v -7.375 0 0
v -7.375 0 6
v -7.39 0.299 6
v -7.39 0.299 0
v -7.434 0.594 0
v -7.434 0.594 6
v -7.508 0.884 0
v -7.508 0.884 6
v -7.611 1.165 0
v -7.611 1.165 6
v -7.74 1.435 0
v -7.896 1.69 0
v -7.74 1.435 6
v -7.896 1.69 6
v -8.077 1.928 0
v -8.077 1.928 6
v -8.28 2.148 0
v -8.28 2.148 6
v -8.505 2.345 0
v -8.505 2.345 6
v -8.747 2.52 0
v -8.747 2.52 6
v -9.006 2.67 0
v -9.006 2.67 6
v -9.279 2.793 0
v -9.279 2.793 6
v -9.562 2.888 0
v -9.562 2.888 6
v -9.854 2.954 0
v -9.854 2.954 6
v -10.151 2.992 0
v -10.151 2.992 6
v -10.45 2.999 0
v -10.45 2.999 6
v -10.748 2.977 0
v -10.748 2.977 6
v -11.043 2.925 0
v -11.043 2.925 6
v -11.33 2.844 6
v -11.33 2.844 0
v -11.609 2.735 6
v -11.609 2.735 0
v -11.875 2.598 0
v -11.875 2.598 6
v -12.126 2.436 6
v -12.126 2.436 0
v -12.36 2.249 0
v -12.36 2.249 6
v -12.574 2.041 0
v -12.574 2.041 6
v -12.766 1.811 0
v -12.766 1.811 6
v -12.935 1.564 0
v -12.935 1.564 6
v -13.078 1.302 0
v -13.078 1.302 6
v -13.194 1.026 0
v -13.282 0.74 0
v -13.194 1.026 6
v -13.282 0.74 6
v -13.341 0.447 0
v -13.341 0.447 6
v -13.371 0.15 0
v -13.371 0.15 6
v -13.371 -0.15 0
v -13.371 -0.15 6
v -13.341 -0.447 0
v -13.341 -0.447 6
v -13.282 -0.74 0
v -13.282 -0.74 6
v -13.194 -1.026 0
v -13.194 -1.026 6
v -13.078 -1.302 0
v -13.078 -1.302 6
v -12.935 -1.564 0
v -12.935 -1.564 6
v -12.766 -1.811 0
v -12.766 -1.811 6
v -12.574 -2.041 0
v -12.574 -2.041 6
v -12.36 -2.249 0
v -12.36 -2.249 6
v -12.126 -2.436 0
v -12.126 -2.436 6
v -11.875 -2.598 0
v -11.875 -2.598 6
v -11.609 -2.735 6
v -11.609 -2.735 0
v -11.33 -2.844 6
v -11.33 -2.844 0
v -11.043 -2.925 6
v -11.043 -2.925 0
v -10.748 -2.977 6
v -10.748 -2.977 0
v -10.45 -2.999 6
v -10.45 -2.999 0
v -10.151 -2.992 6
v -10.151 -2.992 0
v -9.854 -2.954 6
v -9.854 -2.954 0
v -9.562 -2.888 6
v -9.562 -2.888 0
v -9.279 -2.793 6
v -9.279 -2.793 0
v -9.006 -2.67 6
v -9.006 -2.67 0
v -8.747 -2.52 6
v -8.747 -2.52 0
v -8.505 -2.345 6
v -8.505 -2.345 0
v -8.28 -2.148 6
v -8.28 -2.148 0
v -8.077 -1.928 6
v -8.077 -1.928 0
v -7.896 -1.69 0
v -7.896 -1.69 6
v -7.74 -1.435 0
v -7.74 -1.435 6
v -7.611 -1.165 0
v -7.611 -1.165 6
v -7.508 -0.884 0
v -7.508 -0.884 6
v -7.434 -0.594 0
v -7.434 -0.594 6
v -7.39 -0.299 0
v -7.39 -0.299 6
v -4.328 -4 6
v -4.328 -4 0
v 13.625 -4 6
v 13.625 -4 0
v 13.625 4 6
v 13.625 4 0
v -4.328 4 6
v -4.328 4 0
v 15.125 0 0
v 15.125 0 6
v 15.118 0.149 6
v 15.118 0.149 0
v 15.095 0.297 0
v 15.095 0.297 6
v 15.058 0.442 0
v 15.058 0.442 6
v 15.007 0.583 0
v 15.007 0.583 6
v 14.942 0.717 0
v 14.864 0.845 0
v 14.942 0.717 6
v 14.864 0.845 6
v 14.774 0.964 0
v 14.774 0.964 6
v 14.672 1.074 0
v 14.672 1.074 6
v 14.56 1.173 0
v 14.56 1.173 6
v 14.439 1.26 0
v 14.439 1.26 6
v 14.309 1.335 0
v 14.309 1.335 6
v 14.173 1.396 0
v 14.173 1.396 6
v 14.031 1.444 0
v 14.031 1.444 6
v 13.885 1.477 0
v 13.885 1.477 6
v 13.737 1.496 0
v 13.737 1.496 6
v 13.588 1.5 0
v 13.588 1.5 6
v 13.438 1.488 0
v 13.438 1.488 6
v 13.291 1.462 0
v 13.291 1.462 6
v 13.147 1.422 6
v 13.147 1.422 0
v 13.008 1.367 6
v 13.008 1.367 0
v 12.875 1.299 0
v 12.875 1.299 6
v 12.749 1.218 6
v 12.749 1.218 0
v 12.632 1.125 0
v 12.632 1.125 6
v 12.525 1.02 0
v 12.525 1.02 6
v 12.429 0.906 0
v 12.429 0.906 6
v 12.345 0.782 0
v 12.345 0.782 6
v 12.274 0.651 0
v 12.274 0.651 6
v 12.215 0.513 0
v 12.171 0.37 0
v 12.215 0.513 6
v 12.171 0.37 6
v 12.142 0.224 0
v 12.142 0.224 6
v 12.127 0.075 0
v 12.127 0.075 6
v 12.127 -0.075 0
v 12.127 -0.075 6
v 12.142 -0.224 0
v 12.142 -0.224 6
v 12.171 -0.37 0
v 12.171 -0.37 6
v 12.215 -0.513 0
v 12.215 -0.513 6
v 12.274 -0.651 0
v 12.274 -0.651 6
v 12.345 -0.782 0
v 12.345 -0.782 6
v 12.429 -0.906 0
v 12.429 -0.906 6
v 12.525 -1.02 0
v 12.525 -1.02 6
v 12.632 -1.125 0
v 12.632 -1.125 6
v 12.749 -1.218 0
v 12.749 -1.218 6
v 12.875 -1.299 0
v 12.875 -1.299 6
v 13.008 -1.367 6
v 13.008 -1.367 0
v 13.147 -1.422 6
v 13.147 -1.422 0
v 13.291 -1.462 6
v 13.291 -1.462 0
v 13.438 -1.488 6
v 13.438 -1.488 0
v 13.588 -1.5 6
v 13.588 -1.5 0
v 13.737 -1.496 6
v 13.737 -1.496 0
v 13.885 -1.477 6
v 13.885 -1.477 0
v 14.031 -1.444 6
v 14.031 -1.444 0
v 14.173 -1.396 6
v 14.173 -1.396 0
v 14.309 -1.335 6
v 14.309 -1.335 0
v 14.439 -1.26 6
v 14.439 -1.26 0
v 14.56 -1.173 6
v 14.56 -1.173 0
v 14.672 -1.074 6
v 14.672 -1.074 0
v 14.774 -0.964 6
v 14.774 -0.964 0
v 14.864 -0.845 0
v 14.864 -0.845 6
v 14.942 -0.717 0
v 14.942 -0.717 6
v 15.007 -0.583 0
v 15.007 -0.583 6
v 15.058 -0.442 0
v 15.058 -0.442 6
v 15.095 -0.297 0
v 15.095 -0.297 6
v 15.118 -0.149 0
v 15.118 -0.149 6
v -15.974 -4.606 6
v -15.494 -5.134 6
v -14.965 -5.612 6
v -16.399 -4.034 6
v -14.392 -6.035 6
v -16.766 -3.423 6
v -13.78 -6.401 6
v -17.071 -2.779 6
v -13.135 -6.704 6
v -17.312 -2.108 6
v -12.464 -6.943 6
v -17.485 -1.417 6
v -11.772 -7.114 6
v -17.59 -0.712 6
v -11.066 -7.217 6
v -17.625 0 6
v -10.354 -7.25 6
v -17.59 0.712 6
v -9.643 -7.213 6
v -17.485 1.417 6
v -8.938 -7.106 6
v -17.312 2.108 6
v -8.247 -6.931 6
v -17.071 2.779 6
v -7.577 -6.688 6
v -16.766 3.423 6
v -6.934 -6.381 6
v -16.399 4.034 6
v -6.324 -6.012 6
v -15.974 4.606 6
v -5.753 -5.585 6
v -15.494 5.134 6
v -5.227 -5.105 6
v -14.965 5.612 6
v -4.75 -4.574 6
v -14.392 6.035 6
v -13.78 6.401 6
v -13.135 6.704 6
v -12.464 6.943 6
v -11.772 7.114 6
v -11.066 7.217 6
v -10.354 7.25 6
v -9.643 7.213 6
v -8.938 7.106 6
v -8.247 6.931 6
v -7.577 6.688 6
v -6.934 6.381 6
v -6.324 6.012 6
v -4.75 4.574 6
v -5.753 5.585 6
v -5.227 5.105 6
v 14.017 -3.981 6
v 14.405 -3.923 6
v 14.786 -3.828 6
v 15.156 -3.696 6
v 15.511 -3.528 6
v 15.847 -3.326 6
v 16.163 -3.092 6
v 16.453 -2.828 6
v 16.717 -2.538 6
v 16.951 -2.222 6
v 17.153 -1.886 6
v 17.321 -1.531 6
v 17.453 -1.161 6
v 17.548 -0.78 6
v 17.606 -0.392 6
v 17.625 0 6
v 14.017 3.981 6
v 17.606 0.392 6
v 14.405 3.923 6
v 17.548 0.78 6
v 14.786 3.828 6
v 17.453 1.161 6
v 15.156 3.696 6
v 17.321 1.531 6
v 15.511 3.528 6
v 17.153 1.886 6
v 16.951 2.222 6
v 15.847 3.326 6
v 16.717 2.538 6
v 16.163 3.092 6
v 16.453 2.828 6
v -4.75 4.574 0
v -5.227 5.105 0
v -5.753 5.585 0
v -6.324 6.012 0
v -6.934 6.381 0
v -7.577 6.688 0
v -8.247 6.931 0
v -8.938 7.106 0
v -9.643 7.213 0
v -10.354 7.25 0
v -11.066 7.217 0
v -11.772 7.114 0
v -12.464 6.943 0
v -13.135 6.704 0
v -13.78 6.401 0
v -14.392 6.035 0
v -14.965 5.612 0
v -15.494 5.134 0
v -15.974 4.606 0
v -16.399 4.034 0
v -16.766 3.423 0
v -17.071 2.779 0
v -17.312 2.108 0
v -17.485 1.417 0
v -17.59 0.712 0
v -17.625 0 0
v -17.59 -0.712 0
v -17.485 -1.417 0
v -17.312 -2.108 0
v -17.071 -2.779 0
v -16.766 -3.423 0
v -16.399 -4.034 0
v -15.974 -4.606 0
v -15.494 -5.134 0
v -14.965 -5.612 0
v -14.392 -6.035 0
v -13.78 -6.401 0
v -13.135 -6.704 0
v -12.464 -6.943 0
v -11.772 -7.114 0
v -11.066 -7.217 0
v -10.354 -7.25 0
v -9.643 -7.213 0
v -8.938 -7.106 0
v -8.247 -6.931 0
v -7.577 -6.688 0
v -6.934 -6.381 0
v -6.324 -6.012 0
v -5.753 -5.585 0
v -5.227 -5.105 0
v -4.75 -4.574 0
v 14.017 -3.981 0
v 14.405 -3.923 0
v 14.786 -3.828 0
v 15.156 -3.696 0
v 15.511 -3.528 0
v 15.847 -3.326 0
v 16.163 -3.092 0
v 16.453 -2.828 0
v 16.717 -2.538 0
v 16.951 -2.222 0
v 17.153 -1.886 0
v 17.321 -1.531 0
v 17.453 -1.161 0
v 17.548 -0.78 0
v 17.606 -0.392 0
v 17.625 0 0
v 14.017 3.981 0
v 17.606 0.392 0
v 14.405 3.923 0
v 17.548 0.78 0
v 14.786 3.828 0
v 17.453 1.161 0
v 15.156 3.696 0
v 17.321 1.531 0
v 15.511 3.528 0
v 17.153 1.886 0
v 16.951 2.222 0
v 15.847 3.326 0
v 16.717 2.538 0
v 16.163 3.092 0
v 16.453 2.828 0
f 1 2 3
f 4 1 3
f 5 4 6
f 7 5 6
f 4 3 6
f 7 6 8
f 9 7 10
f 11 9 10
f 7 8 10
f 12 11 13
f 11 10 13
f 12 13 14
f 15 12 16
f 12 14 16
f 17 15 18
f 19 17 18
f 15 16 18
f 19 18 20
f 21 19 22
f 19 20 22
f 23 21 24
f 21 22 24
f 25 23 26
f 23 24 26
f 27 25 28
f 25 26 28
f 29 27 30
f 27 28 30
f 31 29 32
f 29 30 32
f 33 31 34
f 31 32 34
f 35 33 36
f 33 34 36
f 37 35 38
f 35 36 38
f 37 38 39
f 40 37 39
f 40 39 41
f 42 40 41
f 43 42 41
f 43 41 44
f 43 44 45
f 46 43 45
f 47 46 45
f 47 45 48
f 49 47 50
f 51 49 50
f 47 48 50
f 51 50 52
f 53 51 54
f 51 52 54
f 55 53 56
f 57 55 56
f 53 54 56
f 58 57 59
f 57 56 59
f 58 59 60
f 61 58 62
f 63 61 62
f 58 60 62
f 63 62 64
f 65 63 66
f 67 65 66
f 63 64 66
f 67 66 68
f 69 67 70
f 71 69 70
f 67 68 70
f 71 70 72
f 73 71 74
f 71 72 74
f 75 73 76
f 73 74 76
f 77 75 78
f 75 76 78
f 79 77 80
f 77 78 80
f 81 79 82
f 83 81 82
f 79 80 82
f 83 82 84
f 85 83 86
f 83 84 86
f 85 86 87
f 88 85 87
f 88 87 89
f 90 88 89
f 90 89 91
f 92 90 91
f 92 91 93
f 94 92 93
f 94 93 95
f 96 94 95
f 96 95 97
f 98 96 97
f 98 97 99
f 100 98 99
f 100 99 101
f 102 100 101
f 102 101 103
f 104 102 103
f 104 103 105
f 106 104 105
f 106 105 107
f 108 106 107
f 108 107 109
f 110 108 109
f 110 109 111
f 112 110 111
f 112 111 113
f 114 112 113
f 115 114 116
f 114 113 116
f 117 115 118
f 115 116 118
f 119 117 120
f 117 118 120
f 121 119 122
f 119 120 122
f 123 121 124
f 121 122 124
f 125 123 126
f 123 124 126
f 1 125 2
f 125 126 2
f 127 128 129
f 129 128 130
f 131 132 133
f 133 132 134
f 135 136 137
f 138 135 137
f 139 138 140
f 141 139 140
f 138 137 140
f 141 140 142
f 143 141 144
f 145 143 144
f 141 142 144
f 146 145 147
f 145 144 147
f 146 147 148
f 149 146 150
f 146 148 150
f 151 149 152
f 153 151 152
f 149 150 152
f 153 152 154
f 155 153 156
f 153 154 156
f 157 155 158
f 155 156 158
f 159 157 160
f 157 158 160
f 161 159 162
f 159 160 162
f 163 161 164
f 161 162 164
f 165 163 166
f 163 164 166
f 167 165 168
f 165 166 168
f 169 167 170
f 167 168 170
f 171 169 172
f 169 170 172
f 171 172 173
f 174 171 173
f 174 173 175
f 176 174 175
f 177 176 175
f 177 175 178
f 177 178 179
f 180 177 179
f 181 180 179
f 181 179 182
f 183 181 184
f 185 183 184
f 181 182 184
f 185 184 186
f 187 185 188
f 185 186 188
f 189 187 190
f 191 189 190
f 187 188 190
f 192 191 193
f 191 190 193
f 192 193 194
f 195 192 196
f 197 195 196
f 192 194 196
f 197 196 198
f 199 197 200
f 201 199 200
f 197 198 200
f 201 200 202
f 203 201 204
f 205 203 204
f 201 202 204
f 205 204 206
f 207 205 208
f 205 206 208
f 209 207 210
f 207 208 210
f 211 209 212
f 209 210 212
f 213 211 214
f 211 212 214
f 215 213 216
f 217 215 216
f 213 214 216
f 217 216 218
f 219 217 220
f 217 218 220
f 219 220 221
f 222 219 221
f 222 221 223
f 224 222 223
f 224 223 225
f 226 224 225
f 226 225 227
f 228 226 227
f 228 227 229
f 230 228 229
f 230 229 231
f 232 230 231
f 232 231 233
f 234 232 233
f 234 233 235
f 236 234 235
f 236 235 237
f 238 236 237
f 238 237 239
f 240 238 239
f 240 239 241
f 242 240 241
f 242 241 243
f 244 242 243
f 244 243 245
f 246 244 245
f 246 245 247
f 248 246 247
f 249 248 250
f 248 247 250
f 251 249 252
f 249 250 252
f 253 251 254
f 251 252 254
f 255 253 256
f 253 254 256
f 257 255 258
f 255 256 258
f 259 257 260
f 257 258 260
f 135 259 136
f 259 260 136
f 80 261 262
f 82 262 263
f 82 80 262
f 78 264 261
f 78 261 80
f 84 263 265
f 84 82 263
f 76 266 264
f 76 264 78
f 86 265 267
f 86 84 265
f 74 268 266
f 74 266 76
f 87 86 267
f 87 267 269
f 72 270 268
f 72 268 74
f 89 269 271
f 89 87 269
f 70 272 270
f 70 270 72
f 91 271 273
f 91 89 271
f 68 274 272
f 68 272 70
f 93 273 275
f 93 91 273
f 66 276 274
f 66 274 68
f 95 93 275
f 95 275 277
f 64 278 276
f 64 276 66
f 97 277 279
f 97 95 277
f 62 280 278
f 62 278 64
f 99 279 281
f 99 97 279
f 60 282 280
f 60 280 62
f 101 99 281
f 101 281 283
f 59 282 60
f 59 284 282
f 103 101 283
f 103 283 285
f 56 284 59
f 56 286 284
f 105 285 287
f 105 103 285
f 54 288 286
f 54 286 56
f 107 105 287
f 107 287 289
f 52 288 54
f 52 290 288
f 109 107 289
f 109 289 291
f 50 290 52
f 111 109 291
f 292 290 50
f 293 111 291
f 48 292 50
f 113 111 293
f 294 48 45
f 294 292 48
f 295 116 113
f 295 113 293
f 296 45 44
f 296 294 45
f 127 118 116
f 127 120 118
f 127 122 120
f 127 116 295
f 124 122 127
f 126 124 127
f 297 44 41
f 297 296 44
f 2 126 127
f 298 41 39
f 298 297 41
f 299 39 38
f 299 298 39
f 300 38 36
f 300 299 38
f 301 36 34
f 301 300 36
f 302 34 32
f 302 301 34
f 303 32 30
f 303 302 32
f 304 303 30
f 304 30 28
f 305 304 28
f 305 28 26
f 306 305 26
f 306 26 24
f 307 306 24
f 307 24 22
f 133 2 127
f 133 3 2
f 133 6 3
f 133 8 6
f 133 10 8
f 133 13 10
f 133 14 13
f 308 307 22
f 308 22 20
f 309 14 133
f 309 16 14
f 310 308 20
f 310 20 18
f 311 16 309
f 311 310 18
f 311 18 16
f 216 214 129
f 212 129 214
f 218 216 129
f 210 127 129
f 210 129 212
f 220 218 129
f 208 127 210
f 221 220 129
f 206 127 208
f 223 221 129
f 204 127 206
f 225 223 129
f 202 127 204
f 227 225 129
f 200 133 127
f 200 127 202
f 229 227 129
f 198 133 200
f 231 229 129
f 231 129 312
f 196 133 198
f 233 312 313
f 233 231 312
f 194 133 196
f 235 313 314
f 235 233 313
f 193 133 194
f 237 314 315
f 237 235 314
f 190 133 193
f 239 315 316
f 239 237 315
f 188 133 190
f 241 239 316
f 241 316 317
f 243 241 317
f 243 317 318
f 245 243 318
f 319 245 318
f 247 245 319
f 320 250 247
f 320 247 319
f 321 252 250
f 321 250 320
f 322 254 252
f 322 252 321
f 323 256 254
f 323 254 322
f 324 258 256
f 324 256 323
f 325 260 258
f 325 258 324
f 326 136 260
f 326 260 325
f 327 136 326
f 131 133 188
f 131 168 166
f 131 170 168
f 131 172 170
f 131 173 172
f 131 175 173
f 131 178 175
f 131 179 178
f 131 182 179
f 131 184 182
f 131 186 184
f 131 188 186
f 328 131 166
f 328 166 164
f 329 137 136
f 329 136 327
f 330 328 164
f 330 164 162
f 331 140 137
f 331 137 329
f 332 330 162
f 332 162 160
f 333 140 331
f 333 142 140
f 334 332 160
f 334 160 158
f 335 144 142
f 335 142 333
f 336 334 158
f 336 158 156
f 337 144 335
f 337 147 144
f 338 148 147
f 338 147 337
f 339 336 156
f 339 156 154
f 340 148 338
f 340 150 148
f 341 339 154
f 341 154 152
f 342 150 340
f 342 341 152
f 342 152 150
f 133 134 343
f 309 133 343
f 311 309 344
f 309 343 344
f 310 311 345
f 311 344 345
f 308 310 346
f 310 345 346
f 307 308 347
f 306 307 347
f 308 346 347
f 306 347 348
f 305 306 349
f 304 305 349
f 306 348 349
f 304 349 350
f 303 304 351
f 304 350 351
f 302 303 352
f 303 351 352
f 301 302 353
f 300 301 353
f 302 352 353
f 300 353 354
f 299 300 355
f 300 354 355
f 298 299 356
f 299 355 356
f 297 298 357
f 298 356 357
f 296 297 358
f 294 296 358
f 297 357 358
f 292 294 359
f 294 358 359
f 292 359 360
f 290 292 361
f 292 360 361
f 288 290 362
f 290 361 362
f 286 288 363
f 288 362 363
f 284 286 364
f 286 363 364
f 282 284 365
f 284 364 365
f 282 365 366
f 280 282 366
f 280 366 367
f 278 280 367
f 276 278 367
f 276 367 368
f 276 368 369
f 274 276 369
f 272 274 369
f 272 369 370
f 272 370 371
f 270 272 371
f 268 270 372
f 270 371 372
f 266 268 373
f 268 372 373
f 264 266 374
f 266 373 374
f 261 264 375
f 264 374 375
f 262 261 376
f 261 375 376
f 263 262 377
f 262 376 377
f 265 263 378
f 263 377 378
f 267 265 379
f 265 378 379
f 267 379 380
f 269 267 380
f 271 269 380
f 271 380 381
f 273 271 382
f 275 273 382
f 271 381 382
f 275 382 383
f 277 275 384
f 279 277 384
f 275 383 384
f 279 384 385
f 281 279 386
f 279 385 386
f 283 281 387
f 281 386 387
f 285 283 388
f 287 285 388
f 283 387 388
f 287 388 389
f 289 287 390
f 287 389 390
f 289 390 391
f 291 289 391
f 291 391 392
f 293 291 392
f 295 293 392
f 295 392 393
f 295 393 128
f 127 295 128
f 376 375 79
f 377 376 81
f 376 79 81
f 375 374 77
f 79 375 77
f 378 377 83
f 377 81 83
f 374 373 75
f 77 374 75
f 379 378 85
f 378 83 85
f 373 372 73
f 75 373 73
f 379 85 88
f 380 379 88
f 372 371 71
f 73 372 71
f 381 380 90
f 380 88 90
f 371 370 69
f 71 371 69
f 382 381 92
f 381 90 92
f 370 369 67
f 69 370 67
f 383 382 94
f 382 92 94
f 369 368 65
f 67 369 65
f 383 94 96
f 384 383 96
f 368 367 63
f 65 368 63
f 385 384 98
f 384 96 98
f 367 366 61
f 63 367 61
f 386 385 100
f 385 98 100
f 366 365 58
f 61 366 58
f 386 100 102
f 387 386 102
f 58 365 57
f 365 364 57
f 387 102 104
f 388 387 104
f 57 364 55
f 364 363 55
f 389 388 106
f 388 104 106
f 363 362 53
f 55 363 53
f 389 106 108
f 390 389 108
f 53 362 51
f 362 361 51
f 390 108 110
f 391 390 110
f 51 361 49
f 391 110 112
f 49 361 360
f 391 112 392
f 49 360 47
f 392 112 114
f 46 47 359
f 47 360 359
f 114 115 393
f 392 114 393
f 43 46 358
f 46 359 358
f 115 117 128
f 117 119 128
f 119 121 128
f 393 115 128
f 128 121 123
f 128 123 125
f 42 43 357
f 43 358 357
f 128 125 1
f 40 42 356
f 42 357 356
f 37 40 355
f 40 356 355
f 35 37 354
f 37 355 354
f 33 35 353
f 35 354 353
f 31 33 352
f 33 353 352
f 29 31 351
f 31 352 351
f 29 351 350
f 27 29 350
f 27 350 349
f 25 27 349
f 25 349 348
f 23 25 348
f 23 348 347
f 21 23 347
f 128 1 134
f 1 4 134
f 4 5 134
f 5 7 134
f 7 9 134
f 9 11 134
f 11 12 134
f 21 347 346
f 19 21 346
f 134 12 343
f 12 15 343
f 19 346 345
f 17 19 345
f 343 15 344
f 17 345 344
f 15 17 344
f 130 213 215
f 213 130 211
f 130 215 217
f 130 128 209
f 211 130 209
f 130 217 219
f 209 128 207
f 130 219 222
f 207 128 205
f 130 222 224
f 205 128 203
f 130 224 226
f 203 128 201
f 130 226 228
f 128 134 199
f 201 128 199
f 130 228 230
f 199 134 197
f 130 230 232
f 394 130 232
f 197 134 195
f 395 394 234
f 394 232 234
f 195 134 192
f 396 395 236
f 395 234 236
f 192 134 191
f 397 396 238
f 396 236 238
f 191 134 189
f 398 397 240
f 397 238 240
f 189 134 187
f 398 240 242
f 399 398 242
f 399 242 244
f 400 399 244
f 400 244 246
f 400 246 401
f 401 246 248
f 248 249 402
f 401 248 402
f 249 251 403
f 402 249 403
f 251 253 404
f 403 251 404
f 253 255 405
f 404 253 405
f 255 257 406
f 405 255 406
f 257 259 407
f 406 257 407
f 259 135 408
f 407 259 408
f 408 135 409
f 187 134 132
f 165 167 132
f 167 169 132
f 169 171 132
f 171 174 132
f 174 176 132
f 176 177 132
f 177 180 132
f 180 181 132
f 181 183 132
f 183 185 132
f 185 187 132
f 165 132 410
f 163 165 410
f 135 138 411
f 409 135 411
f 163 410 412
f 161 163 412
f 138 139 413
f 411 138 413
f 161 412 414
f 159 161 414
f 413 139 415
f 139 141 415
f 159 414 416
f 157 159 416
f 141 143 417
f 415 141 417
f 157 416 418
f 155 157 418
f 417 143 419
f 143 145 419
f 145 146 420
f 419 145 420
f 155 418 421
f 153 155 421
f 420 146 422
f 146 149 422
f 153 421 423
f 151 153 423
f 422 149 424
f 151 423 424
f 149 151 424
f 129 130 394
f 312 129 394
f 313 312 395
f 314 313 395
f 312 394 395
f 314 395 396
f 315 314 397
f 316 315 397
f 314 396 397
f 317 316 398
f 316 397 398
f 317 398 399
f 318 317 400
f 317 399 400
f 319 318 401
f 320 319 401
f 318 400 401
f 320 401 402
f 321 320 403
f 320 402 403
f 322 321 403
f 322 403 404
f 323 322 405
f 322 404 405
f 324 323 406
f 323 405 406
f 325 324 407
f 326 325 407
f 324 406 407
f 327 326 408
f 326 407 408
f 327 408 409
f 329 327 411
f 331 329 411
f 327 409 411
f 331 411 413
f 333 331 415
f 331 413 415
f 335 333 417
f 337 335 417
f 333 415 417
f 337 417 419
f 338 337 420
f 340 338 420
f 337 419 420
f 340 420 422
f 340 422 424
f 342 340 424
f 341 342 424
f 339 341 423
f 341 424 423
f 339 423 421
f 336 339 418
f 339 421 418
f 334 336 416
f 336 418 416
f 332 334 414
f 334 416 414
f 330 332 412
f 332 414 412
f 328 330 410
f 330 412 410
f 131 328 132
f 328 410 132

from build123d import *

# Parameters (mm, degrees)
SKETCH_1_R          = 7.25
SKETCH_1_R_2        = 4
EXTRUDE_1_DEPTH     = 6
SKETCH_2_R          = 3
SKETCH_2_R_2        = 1.5
CUT_EXTRUDE_1_DEPTH = 6


with BuildPart() as part:
    # 草图1 → 凸台-拉伸1 (new body)
    with BuildSketch(Plane.XY):
        with Locations((-10.375, 0)):
            Circle(SKETCH_1_R)
        with BuildLine():
            ThreePointArc((13.625, -4), (9.625, 0), (13.625, 4))
            Line((13.625, 4), (-4.328306689, 4))
            ThreePointArc((-4.328306689, 4), (-3.432341053, 2.088536987), (-3.125, 0))
            ThreePointArc((-3.125, 0), (-3.432341053, -2.088536987), (-4.328306689, -4))
            Line((-4.328306689, -4), (13.625, -4))
        make_face()
        with Locations((13.625, 0)):
            Circle(SKETCH_1_R_2)
    extrude(amount=EXTRUDE_1_DEPTH)

    # 草图2 → 切除-拉伸1 (cut)
    with BuildSketch(Plane.XY.offset(6)):
        with Locations((-10.375, 0)):
            Circle(SKETCH_2_R)
        with Locations((13.625, 0)):
            Circle(SKETCH_2_R_2)
    extrude(amount=-CUT_EXTRUDE_1_DEPTH, mode=Mode.SUBTRACT)


solid = part.part
